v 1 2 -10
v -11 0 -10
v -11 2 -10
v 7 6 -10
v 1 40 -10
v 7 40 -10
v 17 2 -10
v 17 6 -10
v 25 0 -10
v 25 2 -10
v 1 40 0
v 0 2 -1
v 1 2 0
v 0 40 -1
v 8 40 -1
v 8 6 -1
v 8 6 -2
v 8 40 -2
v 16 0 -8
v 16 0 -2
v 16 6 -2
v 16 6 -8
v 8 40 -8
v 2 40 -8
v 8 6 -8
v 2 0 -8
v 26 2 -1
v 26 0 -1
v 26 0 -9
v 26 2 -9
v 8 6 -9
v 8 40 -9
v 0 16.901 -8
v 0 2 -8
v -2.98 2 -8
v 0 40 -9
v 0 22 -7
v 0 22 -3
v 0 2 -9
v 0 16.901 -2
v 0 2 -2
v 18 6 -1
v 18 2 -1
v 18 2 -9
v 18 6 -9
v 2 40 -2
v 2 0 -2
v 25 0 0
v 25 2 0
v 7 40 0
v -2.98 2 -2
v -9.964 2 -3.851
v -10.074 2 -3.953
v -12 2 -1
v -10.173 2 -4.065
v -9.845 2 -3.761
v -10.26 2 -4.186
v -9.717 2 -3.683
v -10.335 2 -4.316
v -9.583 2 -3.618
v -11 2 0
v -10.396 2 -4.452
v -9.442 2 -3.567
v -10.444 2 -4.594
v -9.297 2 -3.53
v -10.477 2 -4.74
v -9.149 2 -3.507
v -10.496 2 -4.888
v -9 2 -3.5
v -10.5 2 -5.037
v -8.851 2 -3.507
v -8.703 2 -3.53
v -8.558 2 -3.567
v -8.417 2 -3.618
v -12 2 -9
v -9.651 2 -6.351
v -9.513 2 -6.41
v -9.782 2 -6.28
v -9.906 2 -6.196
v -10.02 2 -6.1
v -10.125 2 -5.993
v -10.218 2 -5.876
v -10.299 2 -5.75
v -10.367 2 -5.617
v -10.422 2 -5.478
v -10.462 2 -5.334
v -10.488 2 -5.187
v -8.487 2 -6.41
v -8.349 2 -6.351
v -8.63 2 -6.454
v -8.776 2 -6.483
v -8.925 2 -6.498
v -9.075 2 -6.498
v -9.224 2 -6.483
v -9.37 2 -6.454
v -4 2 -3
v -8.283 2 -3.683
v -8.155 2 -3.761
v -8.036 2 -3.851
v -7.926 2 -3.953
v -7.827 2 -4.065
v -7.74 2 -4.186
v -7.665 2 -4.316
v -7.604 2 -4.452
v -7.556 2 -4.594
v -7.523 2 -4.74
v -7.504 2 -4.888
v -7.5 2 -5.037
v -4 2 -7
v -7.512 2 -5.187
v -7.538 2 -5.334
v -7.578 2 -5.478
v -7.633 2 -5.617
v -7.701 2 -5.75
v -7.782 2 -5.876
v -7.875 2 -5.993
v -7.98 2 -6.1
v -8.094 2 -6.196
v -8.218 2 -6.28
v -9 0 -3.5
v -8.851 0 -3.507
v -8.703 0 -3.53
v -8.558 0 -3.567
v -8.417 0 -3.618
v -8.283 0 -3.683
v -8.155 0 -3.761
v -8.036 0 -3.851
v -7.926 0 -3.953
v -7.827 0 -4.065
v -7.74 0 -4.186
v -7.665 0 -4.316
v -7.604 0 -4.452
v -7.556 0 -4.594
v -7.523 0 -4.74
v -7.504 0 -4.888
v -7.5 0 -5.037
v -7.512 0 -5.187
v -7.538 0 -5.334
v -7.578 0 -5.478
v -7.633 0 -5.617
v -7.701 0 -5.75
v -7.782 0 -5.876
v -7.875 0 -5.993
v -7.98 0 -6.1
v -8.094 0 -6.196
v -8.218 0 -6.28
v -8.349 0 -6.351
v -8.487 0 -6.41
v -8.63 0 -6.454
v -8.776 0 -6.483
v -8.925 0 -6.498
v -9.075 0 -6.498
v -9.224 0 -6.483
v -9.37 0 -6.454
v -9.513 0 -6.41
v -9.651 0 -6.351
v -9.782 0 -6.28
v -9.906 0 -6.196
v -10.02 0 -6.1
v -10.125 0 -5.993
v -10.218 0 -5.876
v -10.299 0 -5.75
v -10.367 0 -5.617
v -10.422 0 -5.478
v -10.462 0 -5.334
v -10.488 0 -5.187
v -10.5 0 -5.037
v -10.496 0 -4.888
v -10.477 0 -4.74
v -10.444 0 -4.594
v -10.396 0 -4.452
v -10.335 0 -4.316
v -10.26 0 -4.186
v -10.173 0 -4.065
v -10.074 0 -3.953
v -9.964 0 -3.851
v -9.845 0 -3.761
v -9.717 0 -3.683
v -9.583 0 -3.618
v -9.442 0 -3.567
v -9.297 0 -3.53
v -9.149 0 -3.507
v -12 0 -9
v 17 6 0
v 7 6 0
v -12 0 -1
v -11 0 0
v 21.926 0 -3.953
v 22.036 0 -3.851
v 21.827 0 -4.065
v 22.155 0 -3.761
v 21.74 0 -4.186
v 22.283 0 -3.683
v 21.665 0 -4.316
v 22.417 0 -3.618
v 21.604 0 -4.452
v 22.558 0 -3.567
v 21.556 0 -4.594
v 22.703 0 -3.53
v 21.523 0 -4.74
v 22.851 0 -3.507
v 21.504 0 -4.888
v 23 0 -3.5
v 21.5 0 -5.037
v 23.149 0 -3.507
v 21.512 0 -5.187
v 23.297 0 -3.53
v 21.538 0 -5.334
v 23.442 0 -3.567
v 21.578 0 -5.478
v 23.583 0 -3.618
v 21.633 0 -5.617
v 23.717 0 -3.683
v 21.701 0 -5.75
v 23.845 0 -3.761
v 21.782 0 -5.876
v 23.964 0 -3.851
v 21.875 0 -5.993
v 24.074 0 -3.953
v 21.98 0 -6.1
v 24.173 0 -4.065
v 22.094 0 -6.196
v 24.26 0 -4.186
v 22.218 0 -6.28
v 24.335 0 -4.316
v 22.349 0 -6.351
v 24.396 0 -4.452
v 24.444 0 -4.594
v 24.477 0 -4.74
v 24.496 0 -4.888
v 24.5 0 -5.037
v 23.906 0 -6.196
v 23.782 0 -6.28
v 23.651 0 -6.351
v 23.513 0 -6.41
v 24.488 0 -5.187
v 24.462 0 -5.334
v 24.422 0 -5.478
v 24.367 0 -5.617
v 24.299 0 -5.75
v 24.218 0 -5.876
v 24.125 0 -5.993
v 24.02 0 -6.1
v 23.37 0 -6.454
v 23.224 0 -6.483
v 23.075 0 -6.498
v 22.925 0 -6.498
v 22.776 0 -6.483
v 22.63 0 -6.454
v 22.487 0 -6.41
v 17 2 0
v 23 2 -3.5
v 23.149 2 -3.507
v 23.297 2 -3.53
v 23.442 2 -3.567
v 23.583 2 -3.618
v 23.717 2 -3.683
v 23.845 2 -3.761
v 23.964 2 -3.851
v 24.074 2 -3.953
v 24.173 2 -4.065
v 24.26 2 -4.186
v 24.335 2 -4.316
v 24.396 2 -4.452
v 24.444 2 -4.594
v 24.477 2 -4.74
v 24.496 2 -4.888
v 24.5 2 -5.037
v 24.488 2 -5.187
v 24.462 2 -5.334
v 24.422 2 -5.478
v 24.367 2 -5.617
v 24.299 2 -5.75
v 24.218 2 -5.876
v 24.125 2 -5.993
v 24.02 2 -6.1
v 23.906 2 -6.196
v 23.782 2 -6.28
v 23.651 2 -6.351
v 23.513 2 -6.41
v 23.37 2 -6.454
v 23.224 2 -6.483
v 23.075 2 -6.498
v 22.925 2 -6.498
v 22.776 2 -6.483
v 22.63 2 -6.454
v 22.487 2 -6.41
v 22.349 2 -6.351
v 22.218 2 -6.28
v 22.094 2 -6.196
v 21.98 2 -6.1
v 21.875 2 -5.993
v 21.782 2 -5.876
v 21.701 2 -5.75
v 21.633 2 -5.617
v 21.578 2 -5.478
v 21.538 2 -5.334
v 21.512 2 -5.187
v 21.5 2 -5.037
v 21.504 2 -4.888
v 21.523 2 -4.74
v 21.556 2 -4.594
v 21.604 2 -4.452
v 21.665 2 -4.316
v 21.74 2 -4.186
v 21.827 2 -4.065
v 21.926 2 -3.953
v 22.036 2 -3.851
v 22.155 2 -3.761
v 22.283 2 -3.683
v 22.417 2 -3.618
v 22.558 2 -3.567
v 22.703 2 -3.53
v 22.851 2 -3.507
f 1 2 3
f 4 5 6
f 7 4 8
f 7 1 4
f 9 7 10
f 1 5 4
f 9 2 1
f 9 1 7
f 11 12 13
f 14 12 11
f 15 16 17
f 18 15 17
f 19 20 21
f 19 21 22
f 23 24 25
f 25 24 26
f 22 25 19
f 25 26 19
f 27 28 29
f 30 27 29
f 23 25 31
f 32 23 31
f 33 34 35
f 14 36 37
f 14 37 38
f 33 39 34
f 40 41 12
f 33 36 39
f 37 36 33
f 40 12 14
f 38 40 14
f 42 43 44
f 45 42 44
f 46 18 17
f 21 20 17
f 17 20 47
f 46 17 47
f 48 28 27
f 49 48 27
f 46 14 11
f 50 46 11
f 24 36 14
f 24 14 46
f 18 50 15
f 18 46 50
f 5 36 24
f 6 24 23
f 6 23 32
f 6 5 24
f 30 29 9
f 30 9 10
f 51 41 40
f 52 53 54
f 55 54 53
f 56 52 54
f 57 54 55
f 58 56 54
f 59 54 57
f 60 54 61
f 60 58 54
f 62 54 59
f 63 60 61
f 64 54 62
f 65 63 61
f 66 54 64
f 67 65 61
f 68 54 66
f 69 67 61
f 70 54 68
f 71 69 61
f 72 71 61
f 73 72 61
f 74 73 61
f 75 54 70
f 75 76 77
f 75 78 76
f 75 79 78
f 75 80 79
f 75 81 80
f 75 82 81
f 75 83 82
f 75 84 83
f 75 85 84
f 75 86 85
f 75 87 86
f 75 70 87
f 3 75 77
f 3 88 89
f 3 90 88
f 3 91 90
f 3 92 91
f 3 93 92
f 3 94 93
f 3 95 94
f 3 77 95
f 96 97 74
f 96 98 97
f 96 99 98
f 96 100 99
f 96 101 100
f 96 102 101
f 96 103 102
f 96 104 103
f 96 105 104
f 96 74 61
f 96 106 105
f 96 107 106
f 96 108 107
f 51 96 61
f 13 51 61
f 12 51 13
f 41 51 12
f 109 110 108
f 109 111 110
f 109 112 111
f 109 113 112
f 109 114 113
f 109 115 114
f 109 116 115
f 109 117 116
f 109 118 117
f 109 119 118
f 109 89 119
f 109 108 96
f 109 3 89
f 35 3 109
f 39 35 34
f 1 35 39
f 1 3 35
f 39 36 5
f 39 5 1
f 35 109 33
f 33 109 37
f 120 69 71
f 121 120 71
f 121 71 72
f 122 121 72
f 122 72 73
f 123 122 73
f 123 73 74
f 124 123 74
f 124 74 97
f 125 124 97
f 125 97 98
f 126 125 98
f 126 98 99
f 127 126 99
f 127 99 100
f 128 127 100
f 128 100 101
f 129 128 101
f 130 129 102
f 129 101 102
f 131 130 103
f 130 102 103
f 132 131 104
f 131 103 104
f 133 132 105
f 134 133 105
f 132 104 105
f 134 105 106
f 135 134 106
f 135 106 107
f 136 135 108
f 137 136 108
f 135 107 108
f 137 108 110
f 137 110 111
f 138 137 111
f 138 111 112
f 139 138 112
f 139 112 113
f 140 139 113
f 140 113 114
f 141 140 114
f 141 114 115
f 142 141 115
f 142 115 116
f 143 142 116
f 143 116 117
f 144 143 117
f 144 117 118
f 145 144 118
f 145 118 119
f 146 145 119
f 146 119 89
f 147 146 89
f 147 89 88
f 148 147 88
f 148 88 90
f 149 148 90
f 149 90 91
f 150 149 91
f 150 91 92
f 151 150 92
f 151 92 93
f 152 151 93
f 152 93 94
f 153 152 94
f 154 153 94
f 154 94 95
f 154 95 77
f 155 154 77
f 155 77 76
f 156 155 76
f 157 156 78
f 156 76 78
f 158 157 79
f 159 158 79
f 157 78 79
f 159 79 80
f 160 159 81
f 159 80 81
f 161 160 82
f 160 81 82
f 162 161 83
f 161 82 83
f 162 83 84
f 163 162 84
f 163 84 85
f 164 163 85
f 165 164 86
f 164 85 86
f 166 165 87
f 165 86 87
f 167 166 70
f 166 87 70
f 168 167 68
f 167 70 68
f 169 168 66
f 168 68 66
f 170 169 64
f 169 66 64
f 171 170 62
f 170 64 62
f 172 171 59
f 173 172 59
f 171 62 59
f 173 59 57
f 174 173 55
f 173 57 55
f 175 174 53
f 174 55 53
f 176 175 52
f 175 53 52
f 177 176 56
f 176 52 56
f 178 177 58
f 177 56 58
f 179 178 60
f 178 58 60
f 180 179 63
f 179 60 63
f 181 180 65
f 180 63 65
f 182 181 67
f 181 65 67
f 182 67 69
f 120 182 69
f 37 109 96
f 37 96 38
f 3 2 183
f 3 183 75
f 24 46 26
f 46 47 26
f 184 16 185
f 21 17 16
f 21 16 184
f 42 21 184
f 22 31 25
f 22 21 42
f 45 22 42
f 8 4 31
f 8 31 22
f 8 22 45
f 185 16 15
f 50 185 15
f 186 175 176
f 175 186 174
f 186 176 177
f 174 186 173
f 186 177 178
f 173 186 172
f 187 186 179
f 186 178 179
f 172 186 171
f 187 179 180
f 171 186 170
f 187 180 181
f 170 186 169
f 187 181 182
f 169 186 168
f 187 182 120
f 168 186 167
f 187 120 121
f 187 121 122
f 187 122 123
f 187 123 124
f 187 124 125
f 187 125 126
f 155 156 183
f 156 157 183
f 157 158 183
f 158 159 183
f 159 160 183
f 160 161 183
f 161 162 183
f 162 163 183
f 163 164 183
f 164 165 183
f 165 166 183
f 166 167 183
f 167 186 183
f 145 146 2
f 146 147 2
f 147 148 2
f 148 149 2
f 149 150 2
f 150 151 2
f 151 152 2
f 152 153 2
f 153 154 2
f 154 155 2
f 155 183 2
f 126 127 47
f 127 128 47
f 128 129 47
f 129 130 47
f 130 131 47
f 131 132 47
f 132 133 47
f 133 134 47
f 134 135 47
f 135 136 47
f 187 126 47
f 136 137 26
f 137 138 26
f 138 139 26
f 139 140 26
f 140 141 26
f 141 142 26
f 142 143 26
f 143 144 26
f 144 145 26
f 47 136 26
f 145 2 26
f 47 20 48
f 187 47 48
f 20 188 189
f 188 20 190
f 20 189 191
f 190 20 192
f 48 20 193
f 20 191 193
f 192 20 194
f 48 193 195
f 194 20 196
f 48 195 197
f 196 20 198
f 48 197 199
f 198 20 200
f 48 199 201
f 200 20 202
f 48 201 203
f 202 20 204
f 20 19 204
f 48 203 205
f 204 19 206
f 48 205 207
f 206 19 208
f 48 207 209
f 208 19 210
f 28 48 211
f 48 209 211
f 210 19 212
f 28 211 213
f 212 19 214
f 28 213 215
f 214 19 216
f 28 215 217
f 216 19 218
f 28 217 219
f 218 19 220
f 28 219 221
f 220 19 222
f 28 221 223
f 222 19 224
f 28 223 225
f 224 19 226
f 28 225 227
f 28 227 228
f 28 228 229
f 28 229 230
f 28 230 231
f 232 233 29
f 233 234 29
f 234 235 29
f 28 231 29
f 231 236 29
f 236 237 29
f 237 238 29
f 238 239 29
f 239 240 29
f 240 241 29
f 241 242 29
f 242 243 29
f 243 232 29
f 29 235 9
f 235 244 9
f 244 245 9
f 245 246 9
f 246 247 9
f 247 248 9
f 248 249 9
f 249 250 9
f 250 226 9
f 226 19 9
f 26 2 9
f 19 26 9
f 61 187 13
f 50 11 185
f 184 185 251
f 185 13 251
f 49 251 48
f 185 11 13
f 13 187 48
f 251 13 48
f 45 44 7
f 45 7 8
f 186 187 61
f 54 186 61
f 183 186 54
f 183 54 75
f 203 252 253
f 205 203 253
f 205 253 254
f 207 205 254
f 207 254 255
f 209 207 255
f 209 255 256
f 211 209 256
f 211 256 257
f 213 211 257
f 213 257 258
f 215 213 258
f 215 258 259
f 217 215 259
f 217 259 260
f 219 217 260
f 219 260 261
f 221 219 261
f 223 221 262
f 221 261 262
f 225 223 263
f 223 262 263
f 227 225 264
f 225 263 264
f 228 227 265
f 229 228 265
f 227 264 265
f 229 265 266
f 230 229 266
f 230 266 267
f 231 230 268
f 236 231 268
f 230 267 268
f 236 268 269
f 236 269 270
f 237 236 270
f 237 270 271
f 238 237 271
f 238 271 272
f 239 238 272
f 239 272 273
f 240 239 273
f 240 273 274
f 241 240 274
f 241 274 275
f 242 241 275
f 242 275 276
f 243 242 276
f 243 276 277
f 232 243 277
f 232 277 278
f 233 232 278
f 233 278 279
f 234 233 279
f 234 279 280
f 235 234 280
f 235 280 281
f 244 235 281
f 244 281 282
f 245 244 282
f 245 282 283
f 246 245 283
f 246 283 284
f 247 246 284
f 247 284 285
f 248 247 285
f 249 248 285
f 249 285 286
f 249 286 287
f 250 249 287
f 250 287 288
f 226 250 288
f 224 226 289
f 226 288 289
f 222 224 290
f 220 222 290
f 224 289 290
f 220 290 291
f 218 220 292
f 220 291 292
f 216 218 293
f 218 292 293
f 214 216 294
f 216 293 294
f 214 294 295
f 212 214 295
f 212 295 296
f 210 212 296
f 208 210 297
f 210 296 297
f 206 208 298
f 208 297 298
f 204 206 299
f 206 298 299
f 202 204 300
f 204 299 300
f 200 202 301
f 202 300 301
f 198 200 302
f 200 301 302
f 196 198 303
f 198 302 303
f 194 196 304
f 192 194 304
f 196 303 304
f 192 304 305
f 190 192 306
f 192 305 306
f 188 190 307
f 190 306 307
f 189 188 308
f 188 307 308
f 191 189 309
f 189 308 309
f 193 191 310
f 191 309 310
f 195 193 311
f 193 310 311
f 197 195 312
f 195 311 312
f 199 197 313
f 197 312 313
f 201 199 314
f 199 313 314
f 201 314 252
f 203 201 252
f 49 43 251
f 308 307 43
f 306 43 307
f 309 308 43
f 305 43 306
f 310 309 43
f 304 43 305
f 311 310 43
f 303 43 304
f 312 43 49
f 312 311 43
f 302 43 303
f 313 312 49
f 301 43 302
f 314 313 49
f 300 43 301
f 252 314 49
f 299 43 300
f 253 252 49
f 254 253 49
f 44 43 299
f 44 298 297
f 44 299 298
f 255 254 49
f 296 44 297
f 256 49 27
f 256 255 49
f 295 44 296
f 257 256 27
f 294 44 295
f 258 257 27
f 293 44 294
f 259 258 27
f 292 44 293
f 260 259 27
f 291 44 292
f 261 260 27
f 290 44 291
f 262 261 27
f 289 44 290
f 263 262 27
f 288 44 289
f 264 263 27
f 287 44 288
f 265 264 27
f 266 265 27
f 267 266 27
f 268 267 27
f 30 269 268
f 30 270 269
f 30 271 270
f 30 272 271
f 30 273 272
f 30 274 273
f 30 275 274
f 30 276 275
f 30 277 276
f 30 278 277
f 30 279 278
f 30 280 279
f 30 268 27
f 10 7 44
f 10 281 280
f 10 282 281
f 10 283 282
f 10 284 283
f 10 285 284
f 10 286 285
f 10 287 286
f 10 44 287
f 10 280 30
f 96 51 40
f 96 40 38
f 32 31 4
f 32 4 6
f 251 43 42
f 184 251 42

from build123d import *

# Parameters (mm, degrees)
SKETCH1_W                = 18
SKETCH1_H                = 10
SKETCH1_W_2              = 14
SKETCH1_H_2              = 6
BOSS_EXTRUDE1_DEPTH      = 6
BOSS_EXTRUDE2_DEPTH      = 34
SKETCH3_W                = 12
SKETCH3_H                = 10
SKETCH3_W_2              = 8
BOSS_EXTRUDE3_DEPTH      = 2
BOSS_EXTRUDE4_DEPTH      = 3
BOSS_EXTRUDE4_DEPTH_BACK = 3
CHAMFER1_SIZE            = 1
CHAMFER2_SIZE            = 1
SKETCH5_R                = 1.5
CUT_EXTRUDE1_DEPTH       = 48.116875958


with BuildPart() as part:
    # Sketch1 → Boss-Extrude1 (new body)
    with BuildSketch(Plane(origin=(0, 0, 0), x_dir=(1, 0, 0), z_dir=(0, 1, 0))):
        with Locations((9, 5)):
            Rectangle(SKETCH1_W, SKETCH1_H)
        with Locations((9, 5)):
            Rectangle(SKETCH1_W_2, SKETCH1_H_2, mode=Mode.SUBTRACT)
    extrude(amount=BOSS_EXTRUDE1_DEPTH)

    # Sketch2 → Boss-Extrude2 (add)
    with BuildSketch(Plane(origin=(0, 6, 0), x_dir=(1, 0, 0), z_dir=(0, 1, 0))):
        Polygon((0, 10), (0, 0), (8, 0), (8, 2), (2, 2), (2, 8), (8, 8), (8, 10), align=None)
    extrude(amount=BOSS_EXTRUDE2_DEPTH)

    # Sketch3 → Boss-Extrude3 (add)
    with BuildSketch(Plane(origin=(0, 0, 0), x_dir=(1, 0, 0), z_dir=(0, 1, 0))):
        with Locations((-6, 5)):
            Rectangle(SKETCH3_W, SKETCH3_H)
        with Locations((22, 5)):
            Rectangle(SKETCH3_W_2, SKETCH3_H)
    extrude(amount=BOSS_EXTRUDE3_DEPTH)

    # Sketch4 → Boss-Extrude4 (add, two sides: drawn at the far end of the back side and taken through both)
    with BuildSketch(Plane.XY.offset(-5).offset(-BOSS_EXTRUDE4_DEPTH_BACK)):
        Polygon((0, 2), (-4, 2), (0, 22), align=None)
    extrude(amount=BOSS_EXTRUDE4_DEPTH + BOSS_EXTRUDE4_DEPTH_BACK)

    # Chamfer1
    chamfer1_edges = [part.edges().sort_by_distance(p)[0] for p in [
        (8, 23, -10),
        (8, 23, 0),
        (-12, 1, -10),
        (-12, 1, 0),
        (26, 1, 0),
        (26, 1, -10),
        (0, 21, -10),
        (18, 4, -10),
        (18, 4, 0),
        (0, 21, 0),
    ]]
    chamfer(chamfer1_edges, length=CHAMFER1_SIZE)

    # Chamfer2
    chamfer2_edges = [part.edges().sort_by_distance(p)[0] for p in [
        (-2, 12, -8),
        (-2, 12, -2),
    ]]
    chamfer(chamfer2_edges, length=CHAMFER2_SIZE)

    # Sketch5 → Cut-Extrude1 (cut, through all)
    with BuildSketch(Plane(origin=(0, 2, 0), x_dir=(1, 0, 0), z_dir=(0, 1, 0))):
        with Locations(Location((-9, 5, 0), (0, 0, 270))):
            Circle(SKETCH5_R)
        with Locations(Location((23, 5, 0), (0, 0, 270))):
            Circle(SKETCH5_R)
    extrude(amount=-CUT_EXTRUDE1_DEPTH, mode=Mode.SUBTRACT)


solid = part.part
